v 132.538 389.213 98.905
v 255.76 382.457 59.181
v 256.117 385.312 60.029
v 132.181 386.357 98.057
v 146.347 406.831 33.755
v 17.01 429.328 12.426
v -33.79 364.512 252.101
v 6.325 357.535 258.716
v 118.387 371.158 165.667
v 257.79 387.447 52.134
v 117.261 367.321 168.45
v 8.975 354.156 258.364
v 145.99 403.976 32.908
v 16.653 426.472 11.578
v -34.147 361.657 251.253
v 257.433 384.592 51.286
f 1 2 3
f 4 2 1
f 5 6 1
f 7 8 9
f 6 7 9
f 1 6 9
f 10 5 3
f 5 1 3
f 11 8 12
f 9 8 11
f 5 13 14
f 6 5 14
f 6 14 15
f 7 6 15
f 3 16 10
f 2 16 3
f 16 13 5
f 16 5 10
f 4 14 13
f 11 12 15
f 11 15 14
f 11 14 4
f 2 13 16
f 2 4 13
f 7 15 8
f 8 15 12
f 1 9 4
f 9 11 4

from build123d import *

# Parameters (mm, degrees)
BOSS_EXTRUDE1_DEPTH = 3
CUT_EXTRUDE2_DEPTH  = 80
BOSS_EXTRUDE2_DEPTH = 3


with BuildPart() as part:
    # Sketch1 → Boss-Extrude1 (new body)
    with BuildSketch(Plane(origin=(40.618995436, 405.717520436, 71.391276418), x_dir=(0.935705749, -0.202672232, 0.288753733), z_dir=(-0.118950757, -0.951829224, -0.282616075))):
        Polygon((-9.093557887, 199.496352052), (122.645886532, 181.228380511), (87.83671653, -69.797887318), (-43.902727889, -51.529915777), align=None)
    extrude(amount=-BOSS_EXTRUDE1_DEPTH)

    # Sketch3 → Cut-Extrude2 (cut)
    with BuildSketch(Plane(origin=(184.762741438, 119.897305559, 240.069514855), x_dir=(0.516756682, 0.537673014, -0.66623589), z_dir=(0.567103814, 0.368008283, 0.736860345))):
        Polygon((970.937778761, -219.886702224), (970.937778761, 845.245168422), (-1124.286512281, 775.631358808), (-1124.286512281, -289.500511838), align=None)
    extrude(amount=CUT_EXTRUDE2_DEPTH, mode=Mode.SUBTRACT)

    # Sketch4 → Boss-Extrude2 (add)
    with BuildSketch(Plane(origin=(48.910383393, 391.374830059, 116.206579281), x_dir=(0.992857215, -0.11667261, -0.024940964), z_dir=(-0.118950757, -0.951829224, -0.282616075))):
        Polygon((83.713958284, -16.750212929), (96.993345394, -84.345811369), (209.443931521, -62.254508112), (207.834795901, -54.063581501), align=None)
    extrude(amount=-BOSS_EXTRUDE2_DEPTH)


solid = part.part
